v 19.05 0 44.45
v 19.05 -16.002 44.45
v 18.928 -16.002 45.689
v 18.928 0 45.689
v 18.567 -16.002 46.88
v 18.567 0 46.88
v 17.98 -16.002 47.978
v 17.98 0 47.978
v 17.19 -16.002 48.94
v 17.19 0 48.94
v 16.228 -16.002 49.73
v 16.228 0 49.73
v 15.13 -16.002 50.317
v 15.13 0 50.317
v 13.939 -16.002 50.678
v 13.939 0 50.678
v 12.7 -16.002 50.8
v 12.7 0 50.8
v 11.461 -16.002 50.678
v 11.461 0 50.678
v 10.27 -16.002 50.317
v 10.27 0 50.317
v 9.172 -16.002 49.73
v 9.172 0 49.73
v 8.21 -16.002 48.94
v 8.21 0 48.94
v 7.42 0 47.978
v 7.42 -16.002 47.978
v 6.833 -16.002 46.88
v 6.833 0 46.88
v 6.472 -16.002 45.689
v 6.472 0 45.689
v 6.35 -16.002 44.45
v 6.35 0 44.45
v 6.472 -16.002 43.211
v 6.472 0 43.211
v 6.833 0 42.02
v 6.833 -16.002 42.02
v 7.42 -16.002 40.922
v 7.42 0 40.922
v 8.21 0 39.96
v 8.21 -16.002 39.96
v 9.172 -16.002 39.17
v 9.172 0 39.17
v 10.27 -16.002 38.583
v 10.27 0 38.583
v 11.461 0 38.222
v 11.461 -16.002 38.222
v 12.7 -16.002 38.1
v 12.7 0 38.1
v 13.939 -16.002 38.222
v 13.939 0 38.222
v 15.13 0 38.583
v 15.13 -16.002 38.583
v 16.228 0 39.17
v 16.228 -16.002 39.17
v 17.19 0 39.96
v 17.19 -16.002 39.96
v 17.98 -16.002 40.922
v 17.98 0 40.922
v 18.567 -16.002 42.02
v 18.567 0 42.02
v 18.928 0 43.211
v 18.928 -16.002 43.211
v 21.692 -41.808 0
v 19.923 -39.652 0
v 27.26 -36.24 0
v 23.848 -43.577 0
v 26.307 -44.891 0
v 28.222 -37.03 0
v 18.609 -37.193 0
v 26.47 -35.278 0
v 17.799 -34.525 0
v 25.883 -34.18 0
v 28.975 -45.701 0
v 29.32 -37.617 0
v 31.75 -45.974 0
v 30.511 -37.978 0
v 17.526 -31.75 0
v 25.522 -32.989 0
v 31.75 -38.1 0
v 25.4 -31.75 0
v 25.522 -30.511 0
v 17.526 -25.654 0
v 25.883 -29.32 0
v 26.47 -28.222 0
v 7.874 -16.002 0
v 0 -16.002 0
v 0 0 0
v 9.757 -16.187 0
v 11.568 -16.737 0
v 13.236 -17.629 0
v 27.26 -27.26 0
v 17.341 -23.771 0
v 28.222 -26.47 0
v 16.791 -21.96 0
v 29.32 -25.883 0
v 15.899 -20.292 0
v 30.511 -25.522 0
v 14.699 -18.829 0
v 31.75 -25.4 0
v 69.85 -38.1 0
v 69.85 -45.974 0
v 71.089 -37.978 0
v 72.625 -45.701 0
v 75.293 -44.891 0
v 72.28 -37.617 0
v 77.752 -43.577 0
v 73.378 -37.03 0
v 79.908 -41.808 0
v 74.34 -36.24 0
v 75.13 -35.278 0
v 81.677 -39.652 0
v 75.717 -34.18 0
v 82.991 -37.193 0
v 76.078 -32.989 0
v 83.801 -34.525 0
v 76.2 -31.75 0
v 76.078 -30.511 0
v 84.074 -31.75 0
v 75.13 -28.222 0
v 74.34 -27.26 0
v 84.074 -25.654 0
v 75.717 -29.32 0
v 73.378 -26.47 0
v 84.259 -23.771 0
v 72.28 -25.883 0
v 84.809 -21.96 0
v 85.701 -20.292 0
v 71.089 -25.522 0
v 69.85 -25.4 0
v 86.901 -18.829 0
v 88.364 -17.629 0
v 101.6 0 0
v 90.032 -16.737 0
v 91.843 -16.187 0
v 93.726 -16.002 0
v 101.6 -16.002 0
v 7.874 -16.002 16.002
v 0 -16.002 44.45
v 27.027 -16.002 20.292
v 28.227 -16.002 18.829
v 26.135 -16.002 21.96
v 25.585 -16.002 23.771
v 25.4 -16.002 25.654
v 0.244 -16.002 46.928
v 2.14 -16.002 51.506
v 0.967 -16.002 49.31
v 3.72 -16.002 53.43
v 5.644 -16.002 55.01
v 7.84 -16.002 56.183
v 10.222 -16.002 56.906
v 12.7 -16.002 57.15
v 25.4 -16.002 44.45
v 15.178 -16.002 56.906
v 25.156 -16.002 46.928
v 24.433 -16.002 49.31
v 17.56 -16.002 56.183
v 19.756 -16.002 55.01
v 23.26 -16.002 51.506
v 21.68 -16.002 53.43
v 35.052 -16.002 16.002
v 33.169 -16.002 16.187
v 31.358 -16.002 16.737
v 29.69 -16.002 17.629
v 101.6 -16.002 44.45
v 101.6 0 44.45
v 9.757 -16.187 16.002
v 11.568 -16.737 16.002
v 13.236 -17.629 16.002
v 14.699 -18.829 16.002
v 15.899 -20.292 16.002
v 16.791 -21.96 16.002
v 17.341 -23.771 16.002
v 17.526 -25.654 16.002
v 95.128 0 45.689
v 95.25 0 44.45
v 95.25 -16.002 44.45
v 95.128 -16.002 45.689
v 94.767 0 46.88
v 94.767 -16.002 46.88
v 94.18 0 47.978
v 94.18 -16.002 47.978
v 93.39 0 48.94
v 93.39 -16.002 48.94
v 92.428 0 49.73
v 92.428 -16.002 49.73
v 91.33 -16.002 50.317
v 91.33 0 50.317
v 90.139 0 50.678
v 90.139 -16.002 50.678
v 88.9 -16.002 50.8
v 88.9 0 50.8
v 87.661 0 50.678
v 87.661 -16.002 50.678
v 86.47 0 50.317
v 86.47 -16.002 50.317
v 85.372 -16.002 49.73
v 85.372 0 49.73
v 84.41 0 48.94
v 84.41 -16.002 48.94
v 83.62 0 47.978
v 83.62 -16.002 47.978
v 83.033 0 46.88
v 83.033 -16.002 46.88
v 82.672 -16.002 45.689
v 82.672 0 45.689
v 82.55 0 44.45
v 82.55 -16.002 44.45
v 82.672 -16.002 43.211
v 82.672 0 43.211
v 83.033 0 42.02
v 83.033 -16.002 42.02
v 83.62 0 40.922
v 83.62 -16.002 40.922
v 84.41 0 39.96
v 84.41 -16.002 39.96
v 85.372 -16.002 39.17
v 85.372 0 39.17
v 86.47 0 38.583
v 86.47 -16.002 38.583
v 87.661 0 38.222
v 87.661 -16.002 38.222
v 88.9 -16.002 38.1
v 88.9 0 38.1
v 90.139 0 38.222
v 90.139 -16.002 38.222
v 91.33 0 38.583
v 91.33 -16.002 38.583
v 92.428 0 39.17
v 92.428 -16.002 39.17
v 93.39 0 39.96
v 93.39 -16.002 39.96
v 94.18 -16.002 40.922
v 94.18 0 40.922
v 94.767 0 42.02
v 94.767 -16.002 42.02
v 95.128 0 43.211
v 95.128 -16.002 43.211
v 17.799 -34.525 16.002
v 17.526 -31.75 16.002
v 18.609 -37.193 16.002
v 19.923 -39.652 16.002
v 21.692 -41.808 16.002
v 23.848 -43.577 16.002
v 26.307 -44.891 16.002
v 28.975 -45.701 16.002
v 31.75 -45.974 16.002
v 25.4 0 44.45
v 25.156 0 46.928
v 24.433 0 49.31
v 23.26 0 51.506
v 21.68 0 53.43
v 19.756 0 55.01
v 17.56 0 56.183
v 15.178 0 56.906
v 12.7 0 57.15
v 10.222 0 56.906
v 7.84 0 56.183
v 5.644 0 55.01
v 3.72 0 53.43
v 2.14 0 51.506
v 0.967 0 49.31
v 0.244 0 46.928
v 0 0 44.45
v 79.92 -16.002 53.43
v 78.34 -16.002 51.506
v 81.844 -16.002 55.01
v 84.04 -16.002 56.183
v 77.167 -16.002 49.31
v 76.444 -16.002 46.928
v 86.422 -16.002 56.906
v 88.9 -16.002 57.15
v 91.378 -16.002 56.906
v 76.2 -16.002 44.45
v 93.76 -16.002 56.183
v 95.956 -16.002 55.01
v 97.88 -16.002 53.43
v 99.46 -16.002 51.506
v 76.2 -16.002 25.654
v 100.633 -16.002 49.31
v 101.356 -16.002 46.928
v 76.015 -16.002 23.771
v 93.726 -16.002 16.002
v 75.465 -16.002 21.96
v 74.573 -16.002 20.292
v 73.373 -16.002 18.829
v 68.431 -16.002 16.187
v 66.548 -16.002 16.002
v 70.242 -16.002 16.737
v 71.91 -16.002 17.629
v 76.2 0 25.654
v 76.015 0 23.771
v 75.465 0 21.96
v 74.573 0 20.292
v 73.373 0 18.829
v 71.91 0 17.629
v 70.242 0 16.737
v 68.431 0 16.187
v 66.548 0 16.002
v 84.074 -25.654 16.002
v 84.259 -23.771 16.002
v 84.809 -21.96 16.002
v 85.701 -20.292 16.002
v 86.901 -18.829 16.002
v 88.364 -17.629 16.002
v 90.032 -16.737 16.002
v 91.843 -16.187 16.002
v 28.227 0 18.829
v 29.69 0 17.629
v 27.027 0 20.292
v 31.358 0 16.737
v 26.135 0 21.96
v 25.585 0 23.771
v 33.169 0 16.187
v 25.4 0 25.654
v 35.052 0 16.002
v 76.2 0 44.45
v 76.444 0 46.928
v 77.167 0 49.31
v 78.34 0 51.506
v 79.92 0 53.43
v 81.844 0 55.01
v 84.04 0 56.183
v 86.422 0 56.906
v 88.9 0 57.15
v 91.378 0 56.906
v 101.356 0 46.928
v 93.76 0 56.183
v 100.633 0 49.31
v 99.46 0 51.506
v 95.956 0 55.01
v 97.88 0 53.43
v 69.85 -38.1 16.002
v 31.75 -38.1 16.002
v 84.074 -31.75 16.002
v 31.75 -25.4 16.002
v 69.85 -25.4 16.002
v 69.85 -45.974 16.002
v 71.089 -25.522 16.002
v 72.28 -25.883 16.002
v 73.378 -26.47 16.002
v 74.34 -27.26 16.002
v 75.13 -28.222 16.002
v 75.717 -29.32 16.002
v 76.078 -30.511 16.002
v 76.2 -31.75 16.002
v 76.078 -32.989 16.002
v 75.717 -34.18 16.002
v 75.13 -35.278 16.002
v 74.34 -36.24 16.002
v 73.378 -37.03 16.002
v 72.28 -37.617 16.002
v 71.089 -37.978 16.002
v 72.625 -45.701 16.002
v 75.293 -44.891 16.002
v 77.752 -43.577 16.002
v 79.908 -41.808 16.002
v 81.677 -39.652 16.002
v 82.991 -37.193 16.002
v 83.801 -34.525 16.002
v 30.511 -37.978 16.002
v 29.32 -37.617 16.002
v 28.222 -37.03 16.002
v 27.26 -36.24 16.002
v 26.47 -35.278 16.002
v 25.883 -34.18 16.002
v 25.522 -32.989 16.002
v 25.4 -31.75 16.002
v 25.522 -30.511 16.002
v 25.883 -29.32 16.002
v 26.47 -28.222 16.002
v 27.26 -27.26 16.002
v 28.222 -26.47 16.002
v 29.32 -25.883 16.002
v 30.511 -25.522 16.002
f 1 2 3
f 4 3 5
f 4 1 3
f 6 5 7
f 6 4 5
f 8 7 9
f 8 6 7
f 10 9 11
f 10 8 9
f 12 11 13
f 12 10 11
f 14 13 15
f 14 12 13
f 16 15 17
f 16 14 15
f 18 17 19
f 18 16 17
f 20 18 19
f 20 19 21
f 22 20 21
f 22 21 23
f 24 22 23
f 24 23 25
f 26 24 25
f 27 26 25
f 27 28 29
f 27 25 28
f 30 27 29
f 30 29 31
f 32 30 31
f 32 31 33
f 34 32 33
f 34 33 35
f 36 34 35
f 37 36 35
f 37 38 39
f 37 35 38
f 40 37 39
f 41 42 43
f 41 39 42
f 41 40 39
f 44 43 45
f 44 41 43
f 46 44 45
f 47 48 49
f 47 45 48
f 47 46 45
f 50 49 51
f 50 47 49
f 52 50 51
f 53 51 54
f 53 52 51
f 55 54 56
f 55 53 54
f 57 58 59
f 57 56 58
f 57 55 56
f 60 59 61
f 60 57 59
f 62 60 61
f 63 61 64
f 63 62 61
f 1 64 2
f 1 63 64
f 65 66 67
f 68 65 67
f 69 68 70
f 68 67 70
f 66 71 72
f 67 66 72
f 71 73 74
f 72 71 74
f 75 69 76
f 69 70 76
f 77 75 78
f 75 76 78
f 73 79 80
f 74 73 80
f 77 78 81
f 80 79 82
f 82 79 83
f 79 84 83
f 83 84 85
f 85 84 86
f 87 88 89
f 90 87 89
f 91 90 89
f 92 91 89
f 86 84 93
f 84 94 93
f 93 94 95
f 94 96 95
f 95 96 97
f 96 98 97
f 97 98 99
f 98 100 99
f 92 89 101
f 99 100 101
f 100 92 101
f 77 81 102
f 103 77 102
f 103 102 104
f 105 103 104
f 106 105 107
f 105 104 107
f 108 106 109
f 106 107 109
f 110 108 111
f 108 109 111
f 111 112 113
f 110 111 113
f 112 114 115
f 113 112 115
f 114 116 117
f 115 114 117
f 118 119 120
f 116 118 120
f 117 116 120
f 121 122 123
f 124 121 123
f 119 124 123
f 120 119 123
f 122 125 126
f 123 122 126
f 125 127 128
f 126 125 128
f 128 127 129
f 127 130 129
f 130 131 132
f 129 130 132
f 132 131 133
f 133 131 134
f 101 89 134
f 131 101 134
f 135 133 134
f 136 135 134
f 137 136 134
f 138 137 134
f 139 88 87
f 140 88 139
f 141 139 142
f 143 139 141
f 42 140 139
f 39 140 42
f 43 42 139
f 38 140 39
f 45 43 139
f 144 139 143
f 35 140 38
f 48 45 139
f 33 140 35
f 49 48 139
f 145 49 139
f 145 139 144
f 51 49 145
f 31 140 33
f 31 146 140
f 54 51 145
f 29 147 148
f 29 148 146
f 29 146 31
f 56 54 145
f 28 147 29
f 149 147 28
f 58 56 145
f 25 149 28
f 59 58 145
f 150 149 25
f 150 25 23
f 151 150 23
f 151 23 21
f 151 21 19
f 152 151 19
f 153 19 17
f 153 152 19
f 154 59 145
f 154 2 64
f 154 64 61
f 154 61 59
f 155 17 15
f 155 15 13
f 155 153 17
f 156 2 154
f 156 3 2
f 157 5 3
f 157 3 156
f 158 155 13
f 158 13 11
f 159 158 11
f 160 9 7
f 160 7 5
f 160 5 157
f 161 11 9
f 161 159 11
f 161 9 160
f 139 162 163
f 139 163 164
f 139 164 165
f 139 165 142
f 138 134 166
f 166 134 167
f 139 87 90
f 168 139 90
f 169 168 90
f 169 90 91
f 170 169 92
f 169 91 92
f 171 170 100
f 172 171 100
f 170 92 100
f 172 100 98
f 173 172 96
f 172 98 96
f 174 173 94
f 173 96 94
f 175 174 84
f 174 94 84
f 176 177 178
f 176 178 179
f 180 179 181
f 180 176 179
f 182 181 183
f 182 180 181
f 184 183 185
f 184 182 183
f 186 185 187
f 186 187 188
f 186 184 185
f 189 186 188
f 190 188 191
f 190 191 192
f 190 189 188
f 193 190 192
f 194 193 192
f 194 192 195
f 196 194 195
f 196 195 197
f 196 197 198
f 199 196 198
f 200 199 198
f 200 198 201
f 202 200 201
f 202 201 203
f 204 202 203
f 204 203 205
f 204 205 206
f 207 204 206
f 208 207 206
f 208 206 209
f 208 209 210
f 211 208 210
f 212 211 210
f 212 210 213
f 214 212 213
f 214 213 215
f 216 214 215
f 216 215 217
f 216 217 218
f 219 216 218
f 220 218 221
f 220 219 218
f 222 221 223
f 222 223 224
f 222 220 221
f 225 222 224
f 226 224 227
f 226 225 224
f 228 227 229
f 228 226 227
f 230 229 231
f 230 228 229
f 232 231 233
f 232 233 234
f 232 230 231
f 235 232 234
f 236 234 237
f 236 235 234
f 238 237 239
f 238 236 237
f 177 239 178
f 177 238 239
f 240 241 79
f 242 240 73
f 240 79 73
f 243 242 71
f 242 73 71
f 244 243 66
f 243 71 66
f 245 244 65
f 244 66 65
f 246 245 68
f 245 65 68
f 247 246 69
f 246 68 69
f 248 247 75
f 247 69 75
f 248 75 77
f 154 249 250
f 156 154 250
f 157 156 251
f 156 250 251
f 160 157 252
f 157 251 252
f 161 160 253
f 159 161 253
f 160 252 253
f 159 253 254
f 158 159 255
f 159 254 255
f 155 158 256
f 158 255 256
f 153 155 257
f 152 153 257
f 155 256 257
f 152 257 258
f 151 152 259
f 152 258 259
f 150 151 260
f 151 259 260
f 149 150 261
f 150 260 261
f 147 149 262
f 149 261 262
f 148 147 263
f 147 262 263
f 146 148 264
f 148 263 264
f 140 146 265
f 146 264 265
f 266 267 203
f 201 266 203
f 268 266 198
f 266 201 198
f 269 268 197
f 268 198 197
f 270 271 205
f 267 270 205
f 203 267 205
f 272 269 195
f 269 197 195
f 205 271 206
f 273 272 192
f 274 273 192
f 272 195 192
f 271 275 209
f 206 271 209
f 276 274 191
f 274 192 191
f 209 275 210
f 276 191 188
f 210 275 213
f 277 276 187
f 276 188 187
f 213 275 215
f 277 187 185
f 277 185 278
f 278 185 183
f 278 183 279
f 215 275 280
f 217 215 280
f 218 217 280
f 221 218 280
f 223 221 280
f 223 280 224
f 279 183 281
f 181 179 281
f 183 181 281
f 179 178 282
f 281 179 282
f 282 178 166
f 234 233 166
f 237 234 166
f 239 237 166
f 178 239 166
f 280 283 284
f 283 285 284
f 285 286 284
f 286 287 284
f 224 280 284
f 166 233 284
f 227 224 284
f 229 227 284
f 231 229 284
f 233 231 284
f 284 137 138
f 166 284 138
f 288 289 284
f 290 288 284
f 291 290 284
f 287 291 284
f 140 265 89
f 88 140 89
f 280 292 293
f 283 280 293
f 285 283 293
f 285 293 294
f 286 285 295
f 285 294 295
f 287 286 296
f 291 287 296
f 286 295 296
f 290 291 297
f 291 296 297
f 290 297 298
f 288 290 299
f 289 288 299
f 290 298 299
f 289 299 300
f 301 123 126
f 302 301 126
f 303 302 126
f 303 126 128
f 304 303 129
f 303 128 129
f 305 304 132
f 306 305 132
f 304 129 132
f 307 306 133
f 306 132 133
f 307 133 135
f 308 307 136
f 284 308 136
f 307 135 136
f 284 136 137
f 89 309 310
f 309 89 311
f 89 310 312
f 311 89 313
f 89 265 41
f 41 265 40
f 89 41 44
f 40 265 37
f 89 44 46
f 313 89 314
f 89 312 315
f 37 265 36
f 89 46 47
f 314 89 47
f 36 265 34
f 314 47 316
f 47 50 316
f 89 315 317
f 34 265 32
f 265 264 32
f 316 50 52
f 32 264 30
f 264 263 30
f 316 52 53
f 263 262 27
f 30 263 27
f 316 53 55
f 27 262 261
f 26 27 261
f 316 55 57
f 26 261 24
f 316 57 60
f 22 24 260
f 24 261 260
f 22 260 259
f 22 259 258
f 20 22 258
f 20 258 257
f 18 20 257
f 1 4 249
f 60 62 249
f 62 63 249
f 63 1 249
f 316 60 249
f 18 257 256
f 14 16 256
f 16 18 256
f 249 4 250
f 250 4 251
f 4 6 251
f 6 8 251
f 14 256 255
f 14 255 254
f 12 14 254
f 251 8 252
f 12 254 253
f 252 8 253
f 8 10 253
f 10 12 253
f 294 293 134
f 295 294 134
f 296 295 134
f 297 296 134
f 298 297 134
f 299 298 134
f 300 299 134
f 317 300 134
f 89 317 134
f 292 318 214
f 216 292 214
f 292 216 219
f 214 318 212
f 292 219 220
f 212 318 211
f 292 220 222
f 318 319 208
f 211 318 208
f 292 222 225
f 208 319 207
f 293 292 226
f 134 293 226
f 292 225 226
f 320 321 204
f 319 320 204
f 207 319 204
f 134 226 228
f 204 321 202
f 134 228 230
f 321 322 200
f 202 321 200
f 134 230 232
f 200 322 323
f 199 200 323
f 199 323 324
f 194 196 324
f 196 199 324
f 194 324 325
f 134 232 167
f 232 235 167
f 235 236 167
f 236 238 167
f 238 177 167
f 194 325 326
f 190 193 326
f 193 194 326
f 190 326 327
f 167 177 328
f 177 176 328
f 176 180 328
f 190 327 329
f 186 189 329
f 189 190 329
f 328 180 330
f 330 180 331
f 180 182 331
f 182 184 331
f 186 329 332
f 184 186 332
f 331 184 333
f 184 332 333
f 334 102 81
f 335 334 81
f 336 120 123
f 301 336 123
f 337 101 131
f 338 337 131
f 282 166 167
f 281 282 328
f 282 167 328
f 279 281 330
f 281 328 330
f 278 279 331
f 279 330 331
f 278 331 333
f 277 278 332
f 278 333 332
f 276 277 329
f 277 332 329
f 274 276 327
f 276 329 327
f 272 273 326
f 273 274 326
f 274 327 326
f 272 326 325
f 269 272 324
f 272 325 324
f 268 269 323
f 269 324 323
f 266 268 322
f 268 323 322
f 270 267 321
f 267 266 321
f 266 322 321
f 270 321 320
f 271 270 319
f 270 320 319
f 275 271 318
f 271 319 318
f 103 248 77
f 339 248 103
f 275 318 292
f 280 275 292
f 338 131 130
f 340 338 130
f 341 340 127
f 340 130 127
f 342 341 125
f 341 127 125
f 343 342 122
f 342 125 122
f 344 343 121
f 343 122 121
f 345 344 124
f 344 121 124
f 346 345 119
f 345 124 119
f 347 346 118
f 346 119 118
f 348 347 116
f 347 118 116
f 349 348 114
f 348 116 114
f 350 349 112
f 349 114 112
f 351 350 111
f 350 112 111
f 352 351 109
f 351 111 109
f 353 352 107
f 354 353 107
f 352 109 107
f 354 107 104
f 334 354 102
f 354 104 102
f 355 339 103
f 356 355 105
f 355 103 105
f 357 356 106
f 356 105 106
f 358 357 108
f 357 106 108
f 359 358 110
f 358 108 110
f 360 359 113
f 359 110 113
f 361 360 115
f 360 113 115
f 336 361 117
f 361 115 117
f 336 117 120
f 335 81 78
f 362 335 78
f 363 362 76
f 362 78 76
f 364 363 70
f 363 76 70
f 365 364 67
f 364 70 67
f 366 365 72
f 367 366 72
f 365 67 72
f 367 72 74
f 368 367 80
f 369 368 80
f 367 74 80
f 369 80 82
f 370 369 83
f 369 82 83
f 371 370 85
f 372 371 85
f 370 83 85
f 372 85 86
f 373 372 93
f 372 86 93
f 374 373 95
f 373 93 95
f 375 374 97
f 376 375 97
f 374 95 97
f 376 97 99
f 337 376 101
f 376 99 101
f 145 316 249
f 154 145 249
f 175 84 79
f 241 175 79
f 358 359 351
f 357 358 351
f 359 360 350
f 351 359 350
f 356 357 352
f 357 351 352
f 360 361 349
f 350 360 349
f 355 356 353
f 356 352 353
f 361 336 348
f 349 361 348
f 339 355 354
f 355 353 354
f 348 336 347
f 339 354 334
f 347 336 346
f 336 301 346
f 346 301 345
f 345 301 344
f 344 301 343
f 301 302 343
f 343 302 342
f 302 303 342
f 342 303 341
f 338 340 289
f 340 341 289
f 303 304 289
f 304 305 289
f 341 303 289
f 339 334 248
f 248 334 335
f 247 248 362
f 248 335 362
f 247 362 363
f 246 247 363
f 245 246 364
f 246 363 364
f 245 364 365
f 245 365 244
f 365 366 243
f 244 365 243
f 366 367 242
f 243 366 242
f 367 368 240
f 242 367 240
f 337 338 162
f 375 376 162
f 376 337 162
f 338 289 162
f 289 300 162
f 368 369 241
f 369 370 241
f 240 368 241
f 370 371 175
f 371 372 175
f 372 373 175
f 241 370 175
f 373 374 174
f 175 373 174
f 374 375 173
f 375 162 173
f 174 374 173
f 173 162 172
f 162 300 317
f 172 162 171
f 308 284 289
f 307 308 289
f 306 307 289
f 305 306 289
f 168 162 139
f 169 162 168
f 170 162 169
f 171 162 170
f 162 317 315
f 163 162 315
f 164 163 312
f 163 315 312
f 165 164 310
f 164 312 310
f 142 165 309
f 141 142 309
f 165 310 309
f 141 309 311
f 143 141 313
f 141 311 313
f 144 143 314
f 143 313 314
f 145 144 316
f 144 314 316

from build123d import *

# Parameters (mm, degrees)
F0_R     = 6.35
F1_DEPTH = 16.002
F3_DEPTH = 29.972
F5_DEPTH = 57.151


with BuildPart() as f1:
    # F0 (on Front) → F1 (new body)
    with BuildSketch(Plane.XZ):
        with BuildLine():
            Line((0, 44.45), (0, 0))
            Line((0, 0), (101.6, 0))
            Line((101.6, 0), (101.6, 44.45))
            ThreePointArc((101.6, 44.45), (88.9, 57.15), (76.2, 44.45))
            Line((76.2, 44.45), (76.2, 25.654))
            ThreePointArc((76.2, 25.654), (73.372995, 18.829005), (66.548, 16.002))
            Line((66.548, 16.002), (35.052, 16.002))
            ThreePointArc((35.052, 16.002), (28.227005, 18.829005), (25.4, 25.654))
            Line((25.4, 25.654), (25.4, 44.45))
            ThreePointArc((25.4, 44.45), (12.7, 57.15), (0, 44.45))
        make_face()
        with Locations((12.7, 44.45)):
            Circle(F0_R, mode=Mode.SUBTRACT)
        with Locations((88.9, 44.45)):
            Circle(F0_R, mode=Mode.SUBTRACT)
    extrude(amount=F1_DEPTH)

    # F2 (on face) → F3 (join)
    with BuildSketch(Plane.XZ.offset(16.002)):
        Polygon((0, 16.002), (0, 0), (101.6, 0), (101.6, 16.002), (66.548, 16.002), (35.052, 16.002), align=None)
    extrude(amount=F3_DEPTH)

    # F4 (on face) → F5 (cut, through all)
    with BuildSketch(Plane(origin=(0, 0, 0), x_dir=(1, 0, 0), z_dir=(0, 0, -1))):
        with BuildLine():
            ThreePointArc((17.526, 31.75), (21.692113, 41.807887), (31.75, 45.974))
            Line((31.75, 45.974), (0, 45.974))
            Line((0, 45.974), (0, 16.002))
            Line((0, 16.002), (7.874, 16.002))
            ThreePointArc((7.874, 16.002), (14.698995, 18.829005), (17.526, 25.654))
            Line((17.526, 25.654), (17.526, 31.75))
        make_face()
        with BuildLine():
            Line((101.6, 45.974), (69.85, 45.974))
            ThreePointArc((69.85, 45.974), (79.907887, 41.807887), (84.074, 31.75))
            Line((84.074, 31.75), (84.074, 25.654))
            ThreePointArc((84.074, 25.654), (86.901005, 18.829005), (93.726, 16.002))
            Line((93.726, 16.002), (101.6, 16.002))
            Line((101.6, 16.002), (101.6, 45.974))
        make_face()
        with BuildLine():
            Line((69.85, 38.1), (31.75, 38.1))
            ThreePointArc((31.75, 38.1), (25.4, 31.75), (31.75, 25.4))
            Line((31.75, 25.4), (69.85, 25.4))
            ThreePointArc((69.85, 25.4), (76.2, 31.75), (69.85, 38.1))
        make_face()
    extrude(amount=-F5_DEPTH, mode=Mode.SUBTRACT)


solid = f1.part
